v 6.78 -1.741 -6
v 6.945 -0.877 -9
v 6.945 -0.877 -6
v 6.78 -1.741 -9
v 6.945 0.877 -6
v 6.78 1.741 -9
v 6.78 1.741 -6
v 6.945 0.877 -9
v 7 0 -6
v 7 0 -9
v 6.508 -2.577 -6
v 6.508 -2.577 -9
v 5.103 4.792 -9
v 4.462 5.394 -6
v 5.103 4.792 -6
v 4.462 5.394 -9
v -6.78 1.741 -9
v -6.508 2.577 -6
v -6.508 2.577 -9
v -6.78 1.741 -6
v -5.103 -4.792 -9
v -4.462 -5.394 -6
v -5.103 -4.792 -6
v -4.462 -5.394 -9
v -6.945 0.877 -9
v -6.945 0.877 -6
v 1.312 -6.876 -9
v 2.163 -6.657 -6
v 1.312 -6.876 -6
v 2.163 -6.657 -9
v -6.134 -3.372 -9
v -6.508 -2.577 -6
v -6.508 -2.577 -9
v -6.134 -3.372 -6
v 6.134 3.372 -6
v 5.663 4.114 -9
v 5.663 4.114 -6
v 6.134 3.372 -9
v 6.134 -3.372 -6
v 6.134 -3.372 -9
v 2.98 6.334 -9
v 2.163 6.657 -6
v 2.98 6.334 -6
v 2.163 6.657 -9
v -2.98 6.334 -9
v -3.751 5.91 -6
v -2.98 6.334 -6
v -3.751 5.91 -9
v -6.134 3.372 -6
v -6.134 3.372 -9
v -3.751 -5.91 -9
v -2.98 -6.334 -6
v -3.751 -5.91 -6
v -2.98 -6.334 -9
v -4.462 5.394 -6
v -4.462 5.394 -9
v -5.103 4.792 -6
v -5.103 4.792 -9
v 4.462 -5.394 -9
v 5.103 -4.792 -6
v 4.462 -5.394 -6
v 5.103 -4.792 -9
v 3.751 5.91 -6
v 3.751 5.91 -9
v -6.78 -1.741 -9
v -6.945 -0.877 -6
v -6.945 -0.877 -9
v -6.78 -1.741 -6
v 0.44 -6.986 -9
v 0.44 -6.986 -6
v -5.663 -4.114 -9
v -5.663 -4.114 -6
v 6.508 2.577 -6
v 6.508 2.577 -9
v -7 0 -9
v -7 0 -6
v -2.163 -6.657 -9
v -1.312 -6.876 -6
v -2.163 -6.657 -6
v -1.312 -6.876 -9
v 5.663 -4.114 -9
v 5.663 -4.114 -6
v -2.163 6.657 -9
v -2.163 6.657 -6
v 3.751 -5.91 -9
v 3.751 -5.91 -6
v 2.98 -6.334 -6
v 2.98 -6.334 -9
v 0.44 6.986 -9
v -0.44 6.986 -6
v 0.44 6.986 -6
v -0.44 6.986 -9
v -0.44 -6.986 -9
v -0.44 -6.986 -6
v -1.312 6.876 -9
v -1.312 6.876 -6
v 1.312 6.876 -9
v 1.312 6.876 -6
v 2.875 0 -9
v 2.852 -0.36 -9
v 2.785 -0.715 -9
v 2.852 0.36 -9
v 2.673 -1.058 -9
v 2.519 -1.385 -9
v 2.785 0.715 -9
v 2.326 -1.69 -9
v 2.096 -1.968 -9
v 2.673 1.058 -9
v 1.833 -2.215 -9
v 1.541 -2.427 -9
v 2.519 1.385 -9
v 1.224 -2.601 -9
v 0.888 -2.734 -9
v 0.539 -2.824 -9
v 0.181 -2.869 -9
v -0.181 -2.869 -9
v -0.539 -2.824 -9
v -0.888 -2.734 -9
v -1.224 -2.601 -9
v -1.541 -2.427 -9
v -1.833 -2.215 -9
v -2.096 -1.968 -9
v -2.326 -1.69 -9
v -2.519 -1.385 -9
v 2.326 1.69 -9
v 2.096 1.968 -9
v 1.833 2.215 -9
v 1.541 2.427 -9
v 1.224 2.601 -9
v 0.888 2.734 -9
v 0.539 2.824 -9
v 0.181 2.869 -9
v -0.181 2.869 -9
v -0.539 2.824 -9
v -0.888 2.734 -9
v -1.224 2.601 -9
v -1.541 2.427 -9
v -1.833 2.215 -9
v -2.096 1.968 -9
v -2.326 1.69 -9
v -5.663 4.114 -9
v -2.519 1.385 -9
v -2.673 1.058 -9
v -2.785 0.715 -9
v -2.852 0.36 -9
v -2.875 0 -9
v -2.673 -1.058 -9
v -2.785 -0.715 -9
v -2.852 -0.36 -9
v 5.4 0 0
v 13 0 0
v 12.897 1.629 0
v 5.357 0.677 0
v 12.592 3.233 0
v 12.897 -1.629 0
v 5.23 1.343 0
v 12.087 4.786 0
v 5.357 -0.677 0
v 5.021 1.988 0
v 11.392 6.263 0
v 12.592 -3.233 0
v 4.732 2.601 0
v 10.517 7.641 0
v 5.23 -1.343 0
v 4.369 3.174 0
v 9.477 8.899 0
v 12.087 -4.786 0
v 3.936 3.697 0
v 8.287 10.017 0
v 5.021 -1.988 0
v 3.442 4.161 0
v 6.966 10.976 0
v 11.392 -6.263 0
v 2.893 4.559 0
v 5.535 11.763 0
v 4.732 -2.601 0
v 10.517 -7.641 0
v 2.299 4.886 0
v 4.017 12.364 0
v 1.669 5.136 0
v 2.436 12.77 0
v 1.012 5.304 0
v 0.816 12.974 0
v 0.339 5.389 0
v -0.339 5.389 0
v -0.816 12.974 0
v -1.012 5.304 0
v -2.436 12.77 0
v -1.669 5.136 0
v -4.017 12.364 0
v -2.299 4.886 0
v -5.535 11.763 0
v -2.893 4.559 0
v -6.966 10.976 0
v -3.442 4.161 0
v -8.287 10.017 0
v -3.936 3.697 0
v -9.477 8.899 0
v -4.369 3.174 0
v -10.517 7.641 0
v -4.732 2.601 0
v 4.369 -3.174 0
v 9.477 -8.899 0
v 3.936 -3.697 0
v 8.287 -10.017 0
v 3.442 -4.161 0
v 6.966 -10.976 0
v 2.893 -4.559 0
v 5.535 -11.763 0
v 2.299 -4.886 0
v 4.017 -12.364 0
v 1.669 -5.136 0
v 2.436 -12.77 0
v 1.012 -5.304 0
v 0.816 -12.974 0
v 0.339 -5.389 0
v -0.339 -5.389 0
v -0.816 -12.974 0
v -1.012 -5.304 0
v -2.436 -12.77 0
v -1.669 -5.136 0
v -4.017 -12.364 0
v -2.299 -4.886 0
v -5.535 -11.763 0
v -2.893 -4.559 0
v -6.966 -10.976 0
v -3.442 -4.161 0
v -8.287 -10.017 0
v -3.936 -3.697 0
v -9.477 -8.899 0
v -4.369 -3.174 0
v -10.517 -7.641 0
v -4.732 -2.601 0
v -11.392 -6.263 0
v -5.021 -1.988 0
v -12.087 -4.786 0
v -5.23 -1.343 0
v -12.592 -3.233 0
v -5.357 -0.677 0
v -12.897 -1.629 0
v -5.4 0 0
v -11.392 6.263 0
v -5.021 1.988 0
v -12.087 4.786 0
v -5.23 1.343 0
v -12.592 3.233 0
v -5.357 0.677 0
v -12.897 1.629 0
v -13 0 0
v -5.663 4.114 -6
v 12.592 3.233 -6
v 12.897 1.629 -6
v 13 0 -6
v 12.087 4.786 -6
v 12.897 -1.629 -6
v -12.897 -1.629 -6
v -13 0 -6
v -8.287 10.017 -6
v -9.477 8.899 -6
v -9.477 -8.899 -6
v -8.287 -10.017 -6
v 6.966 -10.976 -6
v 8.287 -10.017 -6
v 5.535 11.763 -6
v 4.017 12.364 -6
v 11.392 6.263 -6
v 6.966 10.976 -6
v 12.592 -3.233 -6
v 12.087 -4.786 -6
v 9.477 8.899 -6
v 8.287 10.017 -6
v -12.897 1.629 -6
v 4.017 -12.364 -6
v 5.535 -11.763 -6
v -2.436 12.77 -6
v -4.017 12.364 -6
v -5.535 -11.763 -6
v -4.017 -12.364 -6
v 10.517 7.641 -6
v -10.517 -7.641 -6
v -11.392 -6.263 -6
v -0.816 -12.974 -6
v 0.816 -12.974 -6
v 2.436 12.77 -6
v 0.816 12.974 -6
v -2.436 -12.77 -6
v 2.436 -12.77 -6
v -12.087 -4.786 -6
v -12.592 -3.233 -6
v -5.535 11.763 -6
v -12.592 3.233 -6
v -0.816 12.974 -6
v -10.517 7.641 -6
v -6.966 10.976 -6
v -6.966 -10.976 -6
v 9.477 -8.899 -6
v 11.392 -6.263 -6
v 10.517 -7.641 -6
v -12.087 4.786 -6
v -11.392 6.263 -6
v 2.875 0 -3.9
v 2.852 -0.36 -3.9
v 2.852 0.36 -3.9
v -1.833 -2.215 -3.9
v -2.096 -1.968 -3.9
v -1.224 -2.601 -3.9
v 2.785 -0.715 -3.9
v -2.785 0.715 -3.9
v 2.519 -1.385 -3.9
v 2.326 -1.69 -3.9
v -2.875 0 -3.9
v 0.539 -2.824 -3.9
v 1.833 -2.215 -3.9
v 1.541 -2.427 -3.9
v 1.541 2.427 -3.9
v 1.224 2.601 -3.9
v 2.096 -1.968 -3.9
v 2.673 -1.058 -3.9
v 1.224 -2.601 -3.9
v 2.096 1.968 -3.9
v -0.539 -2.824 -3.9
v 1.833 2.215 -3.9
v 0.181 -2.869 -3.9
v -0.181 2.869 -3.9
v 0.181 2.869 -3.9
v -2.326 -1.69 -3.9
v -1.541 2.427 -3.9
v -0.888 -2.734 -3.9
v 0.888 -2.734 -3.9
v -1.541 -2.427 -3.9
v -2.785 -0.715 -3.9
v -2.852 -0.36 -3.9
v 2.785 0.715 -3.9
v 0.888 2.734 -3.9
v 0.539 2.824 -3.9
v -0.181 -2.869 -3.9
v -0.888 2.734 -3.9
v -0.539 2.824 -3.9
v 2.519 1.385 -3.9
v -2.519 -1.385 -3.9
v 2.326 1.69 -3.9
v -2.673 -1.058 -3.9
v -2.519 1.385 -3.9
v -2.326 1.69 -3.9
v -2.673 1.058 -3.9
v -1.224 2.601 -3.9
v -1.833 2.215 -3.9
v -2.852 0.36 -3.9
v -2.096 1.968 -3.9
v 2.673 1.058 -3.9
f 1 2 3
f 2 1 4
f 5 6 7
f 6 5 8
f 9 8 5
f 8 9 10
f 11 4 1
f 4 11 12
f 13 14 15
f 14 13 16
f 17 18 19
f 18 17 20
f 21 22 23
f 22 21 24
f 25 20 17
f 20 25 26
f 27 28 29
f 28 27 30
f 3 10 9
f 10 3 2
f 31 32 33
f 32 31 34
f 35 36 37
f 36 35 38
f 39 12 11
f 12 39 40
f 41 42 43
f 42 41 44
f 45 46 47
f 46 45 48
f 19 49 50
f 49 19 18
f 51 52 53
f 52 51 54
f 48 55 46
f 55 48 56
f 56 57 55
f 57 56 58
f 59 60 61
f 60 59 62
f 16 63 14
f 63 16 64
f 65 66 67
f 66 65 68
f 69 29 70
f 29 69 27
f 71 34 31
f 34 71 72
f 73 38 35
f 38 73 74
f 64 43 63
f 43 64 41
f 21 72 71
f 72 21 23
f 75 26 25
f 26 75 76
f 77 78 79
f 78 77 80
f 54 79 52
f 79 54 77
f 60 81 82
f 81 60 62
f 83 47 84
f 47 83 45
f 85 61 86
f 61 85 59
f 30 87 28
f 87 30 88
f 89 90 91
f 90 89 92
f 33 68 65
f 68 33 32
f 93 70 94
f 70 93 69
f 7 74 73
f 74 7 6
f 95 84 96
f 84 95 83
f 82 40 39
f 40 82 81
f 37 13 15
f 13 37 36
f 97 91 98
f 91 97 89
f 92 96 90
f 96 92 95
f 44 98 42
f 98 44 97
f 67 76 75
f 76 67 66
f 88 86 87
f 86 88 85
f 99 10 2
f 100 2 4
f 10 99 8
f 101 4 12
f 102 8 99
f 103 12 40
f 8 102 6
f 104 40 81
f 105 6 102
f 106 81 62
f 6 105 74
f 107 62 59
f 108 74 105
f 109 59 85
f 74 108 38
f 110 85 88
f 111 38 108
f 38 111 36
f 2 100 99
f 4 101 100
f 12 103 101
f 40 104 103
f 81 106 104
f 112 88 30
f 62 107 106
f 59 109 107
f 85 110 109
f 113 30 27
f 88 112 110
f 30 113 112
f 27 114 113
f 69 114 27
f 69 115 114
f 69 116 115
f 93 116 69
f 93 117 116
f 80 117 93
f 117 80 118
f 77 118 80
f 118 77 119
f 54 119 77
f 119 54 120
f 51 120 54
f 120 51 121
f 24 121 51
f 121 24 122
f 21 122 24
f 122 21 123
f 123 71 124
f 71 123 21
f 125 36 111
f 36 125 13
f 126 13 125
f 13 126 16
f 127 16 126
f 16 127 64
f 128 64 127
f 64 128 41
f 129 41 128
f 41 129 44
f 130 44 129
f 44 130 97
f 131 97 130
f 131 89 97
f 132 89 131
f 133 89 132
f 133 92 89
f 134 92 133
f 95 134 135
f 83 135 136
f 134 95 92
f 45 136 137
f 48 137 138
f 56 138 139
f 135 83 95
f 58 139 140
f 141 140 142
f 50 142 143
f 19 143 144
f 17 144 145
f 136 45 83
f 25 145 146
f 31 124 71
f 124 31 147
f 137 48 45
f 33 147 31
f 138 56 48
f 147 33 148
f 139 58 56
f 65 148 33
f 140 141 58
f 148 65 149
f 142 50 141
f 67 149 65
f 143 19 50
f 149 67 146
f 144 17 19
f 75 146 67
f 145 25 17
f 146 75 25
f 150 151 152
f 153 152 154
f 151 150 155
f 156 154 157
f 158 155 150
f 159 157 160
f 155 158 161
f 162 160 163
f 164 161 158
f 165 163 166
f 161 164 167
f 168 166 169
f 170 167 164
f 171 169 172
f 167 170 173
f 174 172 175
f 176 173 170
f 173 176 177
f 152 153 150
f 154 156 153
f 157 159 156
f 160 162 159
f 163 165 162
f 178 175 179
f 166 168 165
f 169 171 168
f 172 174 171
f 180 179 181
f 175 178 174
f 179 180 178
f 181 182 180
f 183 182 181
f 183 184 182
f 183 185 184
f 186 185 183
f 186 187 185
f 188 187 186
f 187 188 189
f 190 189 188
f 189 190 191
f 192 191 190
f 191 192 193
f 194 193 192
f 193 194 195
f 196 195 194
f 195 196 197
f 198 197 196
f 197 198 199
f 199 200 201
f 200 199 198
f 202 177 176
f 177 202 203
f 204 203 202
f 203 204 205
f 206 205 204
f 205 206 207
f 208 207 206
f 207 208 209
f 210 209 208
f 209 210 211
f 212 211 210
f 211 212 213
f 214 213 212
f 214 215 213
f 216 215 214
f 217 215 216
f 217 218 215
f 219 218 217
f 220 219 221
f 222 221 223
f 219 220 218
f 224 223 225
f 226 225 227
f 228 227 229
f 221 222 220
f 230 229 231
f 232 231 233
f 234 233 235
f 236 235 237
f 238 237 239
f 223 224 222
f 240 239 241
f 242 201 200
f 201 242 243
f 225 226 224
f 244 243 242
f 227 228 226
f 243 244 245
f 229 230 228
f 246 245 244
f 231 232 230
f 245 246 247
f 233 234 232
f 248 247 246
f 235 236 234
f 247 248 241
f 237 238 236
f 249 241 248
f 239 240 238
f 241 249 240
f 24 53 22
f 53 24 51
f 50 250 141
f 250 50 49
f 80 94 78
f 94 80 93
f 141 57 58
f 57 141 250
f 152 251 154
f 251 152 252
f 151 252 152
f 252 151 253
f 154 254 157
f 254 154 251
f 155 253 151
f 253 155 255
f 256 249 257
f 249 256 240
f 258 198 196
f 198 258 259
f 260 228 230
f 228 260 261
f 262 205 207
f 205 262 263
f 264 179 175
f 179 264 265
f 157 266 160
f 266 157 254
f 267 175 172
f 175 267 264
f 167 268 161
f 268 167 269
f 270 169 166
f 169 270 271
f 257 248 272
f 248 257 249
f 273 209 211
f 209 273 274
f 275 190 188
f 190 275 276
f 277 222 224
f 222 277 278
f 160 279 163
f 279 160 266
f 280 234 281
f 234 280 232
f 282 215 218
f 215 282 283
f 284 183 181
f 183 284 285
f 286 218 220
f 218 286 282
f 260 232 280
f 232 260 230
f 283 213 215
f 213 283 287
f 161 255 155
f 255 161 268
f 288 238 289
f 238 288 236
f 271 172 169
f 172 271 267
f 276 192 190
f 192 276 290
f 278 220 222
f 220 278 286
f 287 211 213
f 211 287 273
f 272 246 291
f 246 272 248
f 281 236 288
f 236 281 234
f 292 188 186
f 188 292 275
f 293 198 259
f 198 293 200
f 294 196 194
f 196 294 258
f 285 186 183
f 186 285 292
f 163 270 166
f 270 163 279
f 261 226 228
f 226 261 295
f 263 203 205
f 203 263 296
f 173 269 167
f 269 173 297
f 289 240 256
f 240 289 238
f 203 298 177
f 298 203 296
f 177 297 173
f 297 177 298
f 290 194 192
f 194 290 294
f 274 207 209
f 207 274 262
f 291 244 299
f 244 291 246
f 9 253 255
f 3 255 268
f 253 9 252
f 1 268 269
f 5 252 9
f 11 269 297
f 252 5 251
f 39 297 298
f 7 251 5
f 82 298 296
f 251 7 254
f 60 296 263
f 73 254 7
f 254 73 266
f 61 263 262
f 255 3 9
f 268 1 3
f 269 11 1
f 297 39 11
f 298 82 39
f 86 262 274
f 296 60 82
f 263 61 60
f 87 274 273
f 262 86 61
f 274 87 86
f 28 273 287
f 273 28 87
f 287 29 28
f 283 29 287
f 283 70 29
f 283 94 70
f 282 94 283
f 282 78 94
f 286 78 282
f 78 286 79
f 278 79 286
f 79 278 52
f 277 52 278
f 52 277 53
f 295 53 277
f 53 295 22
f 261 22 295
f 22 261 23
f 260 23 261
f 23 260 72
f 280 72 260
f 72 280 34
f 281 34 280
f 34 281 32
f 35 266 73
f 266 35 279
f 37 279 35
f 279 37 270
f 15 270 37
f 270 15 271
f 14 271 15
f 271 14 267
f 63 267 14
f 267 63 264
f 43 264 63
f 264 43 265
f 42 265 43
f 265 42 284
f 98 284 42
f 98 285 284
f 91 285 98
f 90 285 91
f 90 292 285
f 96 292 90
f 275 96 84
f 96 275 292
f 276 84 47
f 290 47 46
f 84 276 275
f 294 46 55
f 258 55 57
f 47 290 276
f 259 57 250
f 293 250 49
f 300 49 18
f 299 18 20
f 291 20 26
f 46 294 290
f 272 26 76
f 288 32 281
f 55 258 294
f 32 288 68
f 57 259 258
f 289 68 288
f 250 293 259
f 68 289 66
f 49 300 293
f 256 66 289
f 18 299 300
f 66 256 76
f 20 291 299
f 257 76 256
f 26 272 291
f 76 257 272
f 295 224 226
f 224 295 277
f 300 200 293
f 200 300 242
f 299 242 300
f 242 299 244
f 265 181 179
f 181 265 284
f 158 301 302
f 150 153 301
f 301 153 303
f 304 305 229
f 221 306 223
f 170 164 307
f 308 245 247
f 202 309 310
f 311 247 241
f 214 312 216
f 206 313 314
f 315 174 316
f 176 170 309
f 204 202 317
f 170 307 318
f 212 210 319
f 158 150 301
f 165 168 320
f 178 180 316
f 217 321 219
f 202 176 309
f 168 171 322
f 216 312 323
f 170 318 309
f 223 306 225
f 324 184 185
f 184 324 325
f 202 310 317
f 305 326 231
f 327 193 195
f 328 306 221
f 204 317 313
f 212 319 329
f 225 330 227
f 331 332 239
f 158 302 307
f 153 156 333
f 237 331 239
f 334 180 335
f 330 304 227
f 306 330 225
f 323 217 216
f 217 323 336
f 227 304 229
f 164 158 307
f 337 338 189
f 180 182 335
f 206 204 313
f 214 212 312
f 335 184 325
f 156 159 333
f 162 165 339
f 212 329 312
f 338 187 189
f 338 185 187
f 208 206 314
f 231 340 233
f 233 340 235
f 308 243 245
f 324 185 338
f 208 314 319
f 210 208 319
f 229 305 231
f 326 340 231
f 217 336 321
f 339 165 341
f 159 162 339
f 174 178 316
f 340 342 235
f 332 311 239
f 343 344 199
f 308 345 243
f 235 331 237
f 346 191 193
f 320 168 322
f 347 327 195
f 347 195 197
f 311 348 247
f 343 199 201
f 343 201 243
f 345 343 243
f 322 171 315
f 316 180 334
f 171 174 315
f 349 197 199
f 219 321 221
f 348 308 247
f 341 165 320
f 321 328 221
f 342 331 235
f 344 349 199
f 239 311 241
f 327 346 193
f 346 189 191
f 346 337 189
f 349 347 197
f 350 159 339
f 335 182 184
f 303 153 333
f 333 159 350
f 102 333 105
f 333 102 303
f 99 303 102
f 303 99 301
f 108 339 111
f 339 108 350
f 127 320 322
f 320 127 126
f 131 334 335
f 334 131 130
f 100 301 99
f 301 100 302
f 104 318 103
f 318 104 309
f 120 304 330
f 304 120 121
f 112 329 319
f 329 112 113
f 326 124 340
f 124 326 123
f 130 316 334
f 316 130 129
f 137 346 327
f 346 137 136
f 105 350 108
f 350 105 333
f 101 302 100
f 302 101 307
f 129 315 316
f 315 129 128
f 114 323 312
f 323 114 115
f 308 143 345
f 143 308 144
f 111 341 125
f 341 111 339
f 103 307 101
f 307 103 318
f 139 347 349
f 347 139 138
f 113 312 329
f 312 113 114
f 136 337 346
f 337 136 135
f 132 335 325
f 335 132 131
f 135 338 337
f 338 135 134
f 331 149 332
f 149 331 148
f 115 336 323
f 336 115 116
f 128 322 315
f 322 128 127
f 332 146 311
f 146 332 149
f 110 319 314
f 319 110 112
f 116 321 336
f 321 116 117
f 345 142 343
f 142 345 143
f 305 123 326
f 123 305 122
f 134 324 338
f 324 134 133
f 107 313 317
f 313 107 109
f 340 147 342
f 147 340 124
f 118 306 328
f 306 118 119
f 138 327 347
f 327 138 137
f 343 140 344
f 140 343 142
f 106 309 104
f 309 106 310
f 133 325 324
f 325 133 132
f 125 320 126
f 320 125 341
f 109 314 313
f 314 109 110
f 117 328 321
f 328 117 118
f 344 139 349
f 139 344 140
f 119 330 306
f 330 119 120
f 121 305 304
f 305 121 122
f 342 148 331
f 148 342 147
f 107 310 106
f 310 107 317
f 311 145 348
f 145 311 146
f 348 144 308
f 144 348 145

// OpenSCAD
$fn = 50;


difference() {
	union() {
		translate(v = [0, 0, -9.0000000000]) {
			cylinder(h = 9, r = 7.0000000000);
		}
		translate(v = [0, 0, -6.0000000000]) {
			cylinder(h = 6, r = 13.0000000000);
		}
	}
	union() {
		translate(v = [0, 0, 0]) {
			rotate(a = [0, 0, 0]) {
				difference() {
					union() {
						#translate(v = [0, 0, -9.0000000000]) {
							cylinder(h = 9, r = 2.6000000000);
						}
						#translate(v = [0, 0, -3.9000000000]) {
							cylinder(h = 3.9000000000, r1 = 2.8750000000, r2 = 5.4000000000);
						}
						#translate(v = [0, 0, -9.0000000000]) {
							cylinder(h = 9, r = 2.8750000000);
						}
						#translate(v = [0, 0, -9.0000000000]) {
							cylinder(h = 9, r = 2.6000000000);
						}
					}
					union();
				}
			}
		}
	}
}
